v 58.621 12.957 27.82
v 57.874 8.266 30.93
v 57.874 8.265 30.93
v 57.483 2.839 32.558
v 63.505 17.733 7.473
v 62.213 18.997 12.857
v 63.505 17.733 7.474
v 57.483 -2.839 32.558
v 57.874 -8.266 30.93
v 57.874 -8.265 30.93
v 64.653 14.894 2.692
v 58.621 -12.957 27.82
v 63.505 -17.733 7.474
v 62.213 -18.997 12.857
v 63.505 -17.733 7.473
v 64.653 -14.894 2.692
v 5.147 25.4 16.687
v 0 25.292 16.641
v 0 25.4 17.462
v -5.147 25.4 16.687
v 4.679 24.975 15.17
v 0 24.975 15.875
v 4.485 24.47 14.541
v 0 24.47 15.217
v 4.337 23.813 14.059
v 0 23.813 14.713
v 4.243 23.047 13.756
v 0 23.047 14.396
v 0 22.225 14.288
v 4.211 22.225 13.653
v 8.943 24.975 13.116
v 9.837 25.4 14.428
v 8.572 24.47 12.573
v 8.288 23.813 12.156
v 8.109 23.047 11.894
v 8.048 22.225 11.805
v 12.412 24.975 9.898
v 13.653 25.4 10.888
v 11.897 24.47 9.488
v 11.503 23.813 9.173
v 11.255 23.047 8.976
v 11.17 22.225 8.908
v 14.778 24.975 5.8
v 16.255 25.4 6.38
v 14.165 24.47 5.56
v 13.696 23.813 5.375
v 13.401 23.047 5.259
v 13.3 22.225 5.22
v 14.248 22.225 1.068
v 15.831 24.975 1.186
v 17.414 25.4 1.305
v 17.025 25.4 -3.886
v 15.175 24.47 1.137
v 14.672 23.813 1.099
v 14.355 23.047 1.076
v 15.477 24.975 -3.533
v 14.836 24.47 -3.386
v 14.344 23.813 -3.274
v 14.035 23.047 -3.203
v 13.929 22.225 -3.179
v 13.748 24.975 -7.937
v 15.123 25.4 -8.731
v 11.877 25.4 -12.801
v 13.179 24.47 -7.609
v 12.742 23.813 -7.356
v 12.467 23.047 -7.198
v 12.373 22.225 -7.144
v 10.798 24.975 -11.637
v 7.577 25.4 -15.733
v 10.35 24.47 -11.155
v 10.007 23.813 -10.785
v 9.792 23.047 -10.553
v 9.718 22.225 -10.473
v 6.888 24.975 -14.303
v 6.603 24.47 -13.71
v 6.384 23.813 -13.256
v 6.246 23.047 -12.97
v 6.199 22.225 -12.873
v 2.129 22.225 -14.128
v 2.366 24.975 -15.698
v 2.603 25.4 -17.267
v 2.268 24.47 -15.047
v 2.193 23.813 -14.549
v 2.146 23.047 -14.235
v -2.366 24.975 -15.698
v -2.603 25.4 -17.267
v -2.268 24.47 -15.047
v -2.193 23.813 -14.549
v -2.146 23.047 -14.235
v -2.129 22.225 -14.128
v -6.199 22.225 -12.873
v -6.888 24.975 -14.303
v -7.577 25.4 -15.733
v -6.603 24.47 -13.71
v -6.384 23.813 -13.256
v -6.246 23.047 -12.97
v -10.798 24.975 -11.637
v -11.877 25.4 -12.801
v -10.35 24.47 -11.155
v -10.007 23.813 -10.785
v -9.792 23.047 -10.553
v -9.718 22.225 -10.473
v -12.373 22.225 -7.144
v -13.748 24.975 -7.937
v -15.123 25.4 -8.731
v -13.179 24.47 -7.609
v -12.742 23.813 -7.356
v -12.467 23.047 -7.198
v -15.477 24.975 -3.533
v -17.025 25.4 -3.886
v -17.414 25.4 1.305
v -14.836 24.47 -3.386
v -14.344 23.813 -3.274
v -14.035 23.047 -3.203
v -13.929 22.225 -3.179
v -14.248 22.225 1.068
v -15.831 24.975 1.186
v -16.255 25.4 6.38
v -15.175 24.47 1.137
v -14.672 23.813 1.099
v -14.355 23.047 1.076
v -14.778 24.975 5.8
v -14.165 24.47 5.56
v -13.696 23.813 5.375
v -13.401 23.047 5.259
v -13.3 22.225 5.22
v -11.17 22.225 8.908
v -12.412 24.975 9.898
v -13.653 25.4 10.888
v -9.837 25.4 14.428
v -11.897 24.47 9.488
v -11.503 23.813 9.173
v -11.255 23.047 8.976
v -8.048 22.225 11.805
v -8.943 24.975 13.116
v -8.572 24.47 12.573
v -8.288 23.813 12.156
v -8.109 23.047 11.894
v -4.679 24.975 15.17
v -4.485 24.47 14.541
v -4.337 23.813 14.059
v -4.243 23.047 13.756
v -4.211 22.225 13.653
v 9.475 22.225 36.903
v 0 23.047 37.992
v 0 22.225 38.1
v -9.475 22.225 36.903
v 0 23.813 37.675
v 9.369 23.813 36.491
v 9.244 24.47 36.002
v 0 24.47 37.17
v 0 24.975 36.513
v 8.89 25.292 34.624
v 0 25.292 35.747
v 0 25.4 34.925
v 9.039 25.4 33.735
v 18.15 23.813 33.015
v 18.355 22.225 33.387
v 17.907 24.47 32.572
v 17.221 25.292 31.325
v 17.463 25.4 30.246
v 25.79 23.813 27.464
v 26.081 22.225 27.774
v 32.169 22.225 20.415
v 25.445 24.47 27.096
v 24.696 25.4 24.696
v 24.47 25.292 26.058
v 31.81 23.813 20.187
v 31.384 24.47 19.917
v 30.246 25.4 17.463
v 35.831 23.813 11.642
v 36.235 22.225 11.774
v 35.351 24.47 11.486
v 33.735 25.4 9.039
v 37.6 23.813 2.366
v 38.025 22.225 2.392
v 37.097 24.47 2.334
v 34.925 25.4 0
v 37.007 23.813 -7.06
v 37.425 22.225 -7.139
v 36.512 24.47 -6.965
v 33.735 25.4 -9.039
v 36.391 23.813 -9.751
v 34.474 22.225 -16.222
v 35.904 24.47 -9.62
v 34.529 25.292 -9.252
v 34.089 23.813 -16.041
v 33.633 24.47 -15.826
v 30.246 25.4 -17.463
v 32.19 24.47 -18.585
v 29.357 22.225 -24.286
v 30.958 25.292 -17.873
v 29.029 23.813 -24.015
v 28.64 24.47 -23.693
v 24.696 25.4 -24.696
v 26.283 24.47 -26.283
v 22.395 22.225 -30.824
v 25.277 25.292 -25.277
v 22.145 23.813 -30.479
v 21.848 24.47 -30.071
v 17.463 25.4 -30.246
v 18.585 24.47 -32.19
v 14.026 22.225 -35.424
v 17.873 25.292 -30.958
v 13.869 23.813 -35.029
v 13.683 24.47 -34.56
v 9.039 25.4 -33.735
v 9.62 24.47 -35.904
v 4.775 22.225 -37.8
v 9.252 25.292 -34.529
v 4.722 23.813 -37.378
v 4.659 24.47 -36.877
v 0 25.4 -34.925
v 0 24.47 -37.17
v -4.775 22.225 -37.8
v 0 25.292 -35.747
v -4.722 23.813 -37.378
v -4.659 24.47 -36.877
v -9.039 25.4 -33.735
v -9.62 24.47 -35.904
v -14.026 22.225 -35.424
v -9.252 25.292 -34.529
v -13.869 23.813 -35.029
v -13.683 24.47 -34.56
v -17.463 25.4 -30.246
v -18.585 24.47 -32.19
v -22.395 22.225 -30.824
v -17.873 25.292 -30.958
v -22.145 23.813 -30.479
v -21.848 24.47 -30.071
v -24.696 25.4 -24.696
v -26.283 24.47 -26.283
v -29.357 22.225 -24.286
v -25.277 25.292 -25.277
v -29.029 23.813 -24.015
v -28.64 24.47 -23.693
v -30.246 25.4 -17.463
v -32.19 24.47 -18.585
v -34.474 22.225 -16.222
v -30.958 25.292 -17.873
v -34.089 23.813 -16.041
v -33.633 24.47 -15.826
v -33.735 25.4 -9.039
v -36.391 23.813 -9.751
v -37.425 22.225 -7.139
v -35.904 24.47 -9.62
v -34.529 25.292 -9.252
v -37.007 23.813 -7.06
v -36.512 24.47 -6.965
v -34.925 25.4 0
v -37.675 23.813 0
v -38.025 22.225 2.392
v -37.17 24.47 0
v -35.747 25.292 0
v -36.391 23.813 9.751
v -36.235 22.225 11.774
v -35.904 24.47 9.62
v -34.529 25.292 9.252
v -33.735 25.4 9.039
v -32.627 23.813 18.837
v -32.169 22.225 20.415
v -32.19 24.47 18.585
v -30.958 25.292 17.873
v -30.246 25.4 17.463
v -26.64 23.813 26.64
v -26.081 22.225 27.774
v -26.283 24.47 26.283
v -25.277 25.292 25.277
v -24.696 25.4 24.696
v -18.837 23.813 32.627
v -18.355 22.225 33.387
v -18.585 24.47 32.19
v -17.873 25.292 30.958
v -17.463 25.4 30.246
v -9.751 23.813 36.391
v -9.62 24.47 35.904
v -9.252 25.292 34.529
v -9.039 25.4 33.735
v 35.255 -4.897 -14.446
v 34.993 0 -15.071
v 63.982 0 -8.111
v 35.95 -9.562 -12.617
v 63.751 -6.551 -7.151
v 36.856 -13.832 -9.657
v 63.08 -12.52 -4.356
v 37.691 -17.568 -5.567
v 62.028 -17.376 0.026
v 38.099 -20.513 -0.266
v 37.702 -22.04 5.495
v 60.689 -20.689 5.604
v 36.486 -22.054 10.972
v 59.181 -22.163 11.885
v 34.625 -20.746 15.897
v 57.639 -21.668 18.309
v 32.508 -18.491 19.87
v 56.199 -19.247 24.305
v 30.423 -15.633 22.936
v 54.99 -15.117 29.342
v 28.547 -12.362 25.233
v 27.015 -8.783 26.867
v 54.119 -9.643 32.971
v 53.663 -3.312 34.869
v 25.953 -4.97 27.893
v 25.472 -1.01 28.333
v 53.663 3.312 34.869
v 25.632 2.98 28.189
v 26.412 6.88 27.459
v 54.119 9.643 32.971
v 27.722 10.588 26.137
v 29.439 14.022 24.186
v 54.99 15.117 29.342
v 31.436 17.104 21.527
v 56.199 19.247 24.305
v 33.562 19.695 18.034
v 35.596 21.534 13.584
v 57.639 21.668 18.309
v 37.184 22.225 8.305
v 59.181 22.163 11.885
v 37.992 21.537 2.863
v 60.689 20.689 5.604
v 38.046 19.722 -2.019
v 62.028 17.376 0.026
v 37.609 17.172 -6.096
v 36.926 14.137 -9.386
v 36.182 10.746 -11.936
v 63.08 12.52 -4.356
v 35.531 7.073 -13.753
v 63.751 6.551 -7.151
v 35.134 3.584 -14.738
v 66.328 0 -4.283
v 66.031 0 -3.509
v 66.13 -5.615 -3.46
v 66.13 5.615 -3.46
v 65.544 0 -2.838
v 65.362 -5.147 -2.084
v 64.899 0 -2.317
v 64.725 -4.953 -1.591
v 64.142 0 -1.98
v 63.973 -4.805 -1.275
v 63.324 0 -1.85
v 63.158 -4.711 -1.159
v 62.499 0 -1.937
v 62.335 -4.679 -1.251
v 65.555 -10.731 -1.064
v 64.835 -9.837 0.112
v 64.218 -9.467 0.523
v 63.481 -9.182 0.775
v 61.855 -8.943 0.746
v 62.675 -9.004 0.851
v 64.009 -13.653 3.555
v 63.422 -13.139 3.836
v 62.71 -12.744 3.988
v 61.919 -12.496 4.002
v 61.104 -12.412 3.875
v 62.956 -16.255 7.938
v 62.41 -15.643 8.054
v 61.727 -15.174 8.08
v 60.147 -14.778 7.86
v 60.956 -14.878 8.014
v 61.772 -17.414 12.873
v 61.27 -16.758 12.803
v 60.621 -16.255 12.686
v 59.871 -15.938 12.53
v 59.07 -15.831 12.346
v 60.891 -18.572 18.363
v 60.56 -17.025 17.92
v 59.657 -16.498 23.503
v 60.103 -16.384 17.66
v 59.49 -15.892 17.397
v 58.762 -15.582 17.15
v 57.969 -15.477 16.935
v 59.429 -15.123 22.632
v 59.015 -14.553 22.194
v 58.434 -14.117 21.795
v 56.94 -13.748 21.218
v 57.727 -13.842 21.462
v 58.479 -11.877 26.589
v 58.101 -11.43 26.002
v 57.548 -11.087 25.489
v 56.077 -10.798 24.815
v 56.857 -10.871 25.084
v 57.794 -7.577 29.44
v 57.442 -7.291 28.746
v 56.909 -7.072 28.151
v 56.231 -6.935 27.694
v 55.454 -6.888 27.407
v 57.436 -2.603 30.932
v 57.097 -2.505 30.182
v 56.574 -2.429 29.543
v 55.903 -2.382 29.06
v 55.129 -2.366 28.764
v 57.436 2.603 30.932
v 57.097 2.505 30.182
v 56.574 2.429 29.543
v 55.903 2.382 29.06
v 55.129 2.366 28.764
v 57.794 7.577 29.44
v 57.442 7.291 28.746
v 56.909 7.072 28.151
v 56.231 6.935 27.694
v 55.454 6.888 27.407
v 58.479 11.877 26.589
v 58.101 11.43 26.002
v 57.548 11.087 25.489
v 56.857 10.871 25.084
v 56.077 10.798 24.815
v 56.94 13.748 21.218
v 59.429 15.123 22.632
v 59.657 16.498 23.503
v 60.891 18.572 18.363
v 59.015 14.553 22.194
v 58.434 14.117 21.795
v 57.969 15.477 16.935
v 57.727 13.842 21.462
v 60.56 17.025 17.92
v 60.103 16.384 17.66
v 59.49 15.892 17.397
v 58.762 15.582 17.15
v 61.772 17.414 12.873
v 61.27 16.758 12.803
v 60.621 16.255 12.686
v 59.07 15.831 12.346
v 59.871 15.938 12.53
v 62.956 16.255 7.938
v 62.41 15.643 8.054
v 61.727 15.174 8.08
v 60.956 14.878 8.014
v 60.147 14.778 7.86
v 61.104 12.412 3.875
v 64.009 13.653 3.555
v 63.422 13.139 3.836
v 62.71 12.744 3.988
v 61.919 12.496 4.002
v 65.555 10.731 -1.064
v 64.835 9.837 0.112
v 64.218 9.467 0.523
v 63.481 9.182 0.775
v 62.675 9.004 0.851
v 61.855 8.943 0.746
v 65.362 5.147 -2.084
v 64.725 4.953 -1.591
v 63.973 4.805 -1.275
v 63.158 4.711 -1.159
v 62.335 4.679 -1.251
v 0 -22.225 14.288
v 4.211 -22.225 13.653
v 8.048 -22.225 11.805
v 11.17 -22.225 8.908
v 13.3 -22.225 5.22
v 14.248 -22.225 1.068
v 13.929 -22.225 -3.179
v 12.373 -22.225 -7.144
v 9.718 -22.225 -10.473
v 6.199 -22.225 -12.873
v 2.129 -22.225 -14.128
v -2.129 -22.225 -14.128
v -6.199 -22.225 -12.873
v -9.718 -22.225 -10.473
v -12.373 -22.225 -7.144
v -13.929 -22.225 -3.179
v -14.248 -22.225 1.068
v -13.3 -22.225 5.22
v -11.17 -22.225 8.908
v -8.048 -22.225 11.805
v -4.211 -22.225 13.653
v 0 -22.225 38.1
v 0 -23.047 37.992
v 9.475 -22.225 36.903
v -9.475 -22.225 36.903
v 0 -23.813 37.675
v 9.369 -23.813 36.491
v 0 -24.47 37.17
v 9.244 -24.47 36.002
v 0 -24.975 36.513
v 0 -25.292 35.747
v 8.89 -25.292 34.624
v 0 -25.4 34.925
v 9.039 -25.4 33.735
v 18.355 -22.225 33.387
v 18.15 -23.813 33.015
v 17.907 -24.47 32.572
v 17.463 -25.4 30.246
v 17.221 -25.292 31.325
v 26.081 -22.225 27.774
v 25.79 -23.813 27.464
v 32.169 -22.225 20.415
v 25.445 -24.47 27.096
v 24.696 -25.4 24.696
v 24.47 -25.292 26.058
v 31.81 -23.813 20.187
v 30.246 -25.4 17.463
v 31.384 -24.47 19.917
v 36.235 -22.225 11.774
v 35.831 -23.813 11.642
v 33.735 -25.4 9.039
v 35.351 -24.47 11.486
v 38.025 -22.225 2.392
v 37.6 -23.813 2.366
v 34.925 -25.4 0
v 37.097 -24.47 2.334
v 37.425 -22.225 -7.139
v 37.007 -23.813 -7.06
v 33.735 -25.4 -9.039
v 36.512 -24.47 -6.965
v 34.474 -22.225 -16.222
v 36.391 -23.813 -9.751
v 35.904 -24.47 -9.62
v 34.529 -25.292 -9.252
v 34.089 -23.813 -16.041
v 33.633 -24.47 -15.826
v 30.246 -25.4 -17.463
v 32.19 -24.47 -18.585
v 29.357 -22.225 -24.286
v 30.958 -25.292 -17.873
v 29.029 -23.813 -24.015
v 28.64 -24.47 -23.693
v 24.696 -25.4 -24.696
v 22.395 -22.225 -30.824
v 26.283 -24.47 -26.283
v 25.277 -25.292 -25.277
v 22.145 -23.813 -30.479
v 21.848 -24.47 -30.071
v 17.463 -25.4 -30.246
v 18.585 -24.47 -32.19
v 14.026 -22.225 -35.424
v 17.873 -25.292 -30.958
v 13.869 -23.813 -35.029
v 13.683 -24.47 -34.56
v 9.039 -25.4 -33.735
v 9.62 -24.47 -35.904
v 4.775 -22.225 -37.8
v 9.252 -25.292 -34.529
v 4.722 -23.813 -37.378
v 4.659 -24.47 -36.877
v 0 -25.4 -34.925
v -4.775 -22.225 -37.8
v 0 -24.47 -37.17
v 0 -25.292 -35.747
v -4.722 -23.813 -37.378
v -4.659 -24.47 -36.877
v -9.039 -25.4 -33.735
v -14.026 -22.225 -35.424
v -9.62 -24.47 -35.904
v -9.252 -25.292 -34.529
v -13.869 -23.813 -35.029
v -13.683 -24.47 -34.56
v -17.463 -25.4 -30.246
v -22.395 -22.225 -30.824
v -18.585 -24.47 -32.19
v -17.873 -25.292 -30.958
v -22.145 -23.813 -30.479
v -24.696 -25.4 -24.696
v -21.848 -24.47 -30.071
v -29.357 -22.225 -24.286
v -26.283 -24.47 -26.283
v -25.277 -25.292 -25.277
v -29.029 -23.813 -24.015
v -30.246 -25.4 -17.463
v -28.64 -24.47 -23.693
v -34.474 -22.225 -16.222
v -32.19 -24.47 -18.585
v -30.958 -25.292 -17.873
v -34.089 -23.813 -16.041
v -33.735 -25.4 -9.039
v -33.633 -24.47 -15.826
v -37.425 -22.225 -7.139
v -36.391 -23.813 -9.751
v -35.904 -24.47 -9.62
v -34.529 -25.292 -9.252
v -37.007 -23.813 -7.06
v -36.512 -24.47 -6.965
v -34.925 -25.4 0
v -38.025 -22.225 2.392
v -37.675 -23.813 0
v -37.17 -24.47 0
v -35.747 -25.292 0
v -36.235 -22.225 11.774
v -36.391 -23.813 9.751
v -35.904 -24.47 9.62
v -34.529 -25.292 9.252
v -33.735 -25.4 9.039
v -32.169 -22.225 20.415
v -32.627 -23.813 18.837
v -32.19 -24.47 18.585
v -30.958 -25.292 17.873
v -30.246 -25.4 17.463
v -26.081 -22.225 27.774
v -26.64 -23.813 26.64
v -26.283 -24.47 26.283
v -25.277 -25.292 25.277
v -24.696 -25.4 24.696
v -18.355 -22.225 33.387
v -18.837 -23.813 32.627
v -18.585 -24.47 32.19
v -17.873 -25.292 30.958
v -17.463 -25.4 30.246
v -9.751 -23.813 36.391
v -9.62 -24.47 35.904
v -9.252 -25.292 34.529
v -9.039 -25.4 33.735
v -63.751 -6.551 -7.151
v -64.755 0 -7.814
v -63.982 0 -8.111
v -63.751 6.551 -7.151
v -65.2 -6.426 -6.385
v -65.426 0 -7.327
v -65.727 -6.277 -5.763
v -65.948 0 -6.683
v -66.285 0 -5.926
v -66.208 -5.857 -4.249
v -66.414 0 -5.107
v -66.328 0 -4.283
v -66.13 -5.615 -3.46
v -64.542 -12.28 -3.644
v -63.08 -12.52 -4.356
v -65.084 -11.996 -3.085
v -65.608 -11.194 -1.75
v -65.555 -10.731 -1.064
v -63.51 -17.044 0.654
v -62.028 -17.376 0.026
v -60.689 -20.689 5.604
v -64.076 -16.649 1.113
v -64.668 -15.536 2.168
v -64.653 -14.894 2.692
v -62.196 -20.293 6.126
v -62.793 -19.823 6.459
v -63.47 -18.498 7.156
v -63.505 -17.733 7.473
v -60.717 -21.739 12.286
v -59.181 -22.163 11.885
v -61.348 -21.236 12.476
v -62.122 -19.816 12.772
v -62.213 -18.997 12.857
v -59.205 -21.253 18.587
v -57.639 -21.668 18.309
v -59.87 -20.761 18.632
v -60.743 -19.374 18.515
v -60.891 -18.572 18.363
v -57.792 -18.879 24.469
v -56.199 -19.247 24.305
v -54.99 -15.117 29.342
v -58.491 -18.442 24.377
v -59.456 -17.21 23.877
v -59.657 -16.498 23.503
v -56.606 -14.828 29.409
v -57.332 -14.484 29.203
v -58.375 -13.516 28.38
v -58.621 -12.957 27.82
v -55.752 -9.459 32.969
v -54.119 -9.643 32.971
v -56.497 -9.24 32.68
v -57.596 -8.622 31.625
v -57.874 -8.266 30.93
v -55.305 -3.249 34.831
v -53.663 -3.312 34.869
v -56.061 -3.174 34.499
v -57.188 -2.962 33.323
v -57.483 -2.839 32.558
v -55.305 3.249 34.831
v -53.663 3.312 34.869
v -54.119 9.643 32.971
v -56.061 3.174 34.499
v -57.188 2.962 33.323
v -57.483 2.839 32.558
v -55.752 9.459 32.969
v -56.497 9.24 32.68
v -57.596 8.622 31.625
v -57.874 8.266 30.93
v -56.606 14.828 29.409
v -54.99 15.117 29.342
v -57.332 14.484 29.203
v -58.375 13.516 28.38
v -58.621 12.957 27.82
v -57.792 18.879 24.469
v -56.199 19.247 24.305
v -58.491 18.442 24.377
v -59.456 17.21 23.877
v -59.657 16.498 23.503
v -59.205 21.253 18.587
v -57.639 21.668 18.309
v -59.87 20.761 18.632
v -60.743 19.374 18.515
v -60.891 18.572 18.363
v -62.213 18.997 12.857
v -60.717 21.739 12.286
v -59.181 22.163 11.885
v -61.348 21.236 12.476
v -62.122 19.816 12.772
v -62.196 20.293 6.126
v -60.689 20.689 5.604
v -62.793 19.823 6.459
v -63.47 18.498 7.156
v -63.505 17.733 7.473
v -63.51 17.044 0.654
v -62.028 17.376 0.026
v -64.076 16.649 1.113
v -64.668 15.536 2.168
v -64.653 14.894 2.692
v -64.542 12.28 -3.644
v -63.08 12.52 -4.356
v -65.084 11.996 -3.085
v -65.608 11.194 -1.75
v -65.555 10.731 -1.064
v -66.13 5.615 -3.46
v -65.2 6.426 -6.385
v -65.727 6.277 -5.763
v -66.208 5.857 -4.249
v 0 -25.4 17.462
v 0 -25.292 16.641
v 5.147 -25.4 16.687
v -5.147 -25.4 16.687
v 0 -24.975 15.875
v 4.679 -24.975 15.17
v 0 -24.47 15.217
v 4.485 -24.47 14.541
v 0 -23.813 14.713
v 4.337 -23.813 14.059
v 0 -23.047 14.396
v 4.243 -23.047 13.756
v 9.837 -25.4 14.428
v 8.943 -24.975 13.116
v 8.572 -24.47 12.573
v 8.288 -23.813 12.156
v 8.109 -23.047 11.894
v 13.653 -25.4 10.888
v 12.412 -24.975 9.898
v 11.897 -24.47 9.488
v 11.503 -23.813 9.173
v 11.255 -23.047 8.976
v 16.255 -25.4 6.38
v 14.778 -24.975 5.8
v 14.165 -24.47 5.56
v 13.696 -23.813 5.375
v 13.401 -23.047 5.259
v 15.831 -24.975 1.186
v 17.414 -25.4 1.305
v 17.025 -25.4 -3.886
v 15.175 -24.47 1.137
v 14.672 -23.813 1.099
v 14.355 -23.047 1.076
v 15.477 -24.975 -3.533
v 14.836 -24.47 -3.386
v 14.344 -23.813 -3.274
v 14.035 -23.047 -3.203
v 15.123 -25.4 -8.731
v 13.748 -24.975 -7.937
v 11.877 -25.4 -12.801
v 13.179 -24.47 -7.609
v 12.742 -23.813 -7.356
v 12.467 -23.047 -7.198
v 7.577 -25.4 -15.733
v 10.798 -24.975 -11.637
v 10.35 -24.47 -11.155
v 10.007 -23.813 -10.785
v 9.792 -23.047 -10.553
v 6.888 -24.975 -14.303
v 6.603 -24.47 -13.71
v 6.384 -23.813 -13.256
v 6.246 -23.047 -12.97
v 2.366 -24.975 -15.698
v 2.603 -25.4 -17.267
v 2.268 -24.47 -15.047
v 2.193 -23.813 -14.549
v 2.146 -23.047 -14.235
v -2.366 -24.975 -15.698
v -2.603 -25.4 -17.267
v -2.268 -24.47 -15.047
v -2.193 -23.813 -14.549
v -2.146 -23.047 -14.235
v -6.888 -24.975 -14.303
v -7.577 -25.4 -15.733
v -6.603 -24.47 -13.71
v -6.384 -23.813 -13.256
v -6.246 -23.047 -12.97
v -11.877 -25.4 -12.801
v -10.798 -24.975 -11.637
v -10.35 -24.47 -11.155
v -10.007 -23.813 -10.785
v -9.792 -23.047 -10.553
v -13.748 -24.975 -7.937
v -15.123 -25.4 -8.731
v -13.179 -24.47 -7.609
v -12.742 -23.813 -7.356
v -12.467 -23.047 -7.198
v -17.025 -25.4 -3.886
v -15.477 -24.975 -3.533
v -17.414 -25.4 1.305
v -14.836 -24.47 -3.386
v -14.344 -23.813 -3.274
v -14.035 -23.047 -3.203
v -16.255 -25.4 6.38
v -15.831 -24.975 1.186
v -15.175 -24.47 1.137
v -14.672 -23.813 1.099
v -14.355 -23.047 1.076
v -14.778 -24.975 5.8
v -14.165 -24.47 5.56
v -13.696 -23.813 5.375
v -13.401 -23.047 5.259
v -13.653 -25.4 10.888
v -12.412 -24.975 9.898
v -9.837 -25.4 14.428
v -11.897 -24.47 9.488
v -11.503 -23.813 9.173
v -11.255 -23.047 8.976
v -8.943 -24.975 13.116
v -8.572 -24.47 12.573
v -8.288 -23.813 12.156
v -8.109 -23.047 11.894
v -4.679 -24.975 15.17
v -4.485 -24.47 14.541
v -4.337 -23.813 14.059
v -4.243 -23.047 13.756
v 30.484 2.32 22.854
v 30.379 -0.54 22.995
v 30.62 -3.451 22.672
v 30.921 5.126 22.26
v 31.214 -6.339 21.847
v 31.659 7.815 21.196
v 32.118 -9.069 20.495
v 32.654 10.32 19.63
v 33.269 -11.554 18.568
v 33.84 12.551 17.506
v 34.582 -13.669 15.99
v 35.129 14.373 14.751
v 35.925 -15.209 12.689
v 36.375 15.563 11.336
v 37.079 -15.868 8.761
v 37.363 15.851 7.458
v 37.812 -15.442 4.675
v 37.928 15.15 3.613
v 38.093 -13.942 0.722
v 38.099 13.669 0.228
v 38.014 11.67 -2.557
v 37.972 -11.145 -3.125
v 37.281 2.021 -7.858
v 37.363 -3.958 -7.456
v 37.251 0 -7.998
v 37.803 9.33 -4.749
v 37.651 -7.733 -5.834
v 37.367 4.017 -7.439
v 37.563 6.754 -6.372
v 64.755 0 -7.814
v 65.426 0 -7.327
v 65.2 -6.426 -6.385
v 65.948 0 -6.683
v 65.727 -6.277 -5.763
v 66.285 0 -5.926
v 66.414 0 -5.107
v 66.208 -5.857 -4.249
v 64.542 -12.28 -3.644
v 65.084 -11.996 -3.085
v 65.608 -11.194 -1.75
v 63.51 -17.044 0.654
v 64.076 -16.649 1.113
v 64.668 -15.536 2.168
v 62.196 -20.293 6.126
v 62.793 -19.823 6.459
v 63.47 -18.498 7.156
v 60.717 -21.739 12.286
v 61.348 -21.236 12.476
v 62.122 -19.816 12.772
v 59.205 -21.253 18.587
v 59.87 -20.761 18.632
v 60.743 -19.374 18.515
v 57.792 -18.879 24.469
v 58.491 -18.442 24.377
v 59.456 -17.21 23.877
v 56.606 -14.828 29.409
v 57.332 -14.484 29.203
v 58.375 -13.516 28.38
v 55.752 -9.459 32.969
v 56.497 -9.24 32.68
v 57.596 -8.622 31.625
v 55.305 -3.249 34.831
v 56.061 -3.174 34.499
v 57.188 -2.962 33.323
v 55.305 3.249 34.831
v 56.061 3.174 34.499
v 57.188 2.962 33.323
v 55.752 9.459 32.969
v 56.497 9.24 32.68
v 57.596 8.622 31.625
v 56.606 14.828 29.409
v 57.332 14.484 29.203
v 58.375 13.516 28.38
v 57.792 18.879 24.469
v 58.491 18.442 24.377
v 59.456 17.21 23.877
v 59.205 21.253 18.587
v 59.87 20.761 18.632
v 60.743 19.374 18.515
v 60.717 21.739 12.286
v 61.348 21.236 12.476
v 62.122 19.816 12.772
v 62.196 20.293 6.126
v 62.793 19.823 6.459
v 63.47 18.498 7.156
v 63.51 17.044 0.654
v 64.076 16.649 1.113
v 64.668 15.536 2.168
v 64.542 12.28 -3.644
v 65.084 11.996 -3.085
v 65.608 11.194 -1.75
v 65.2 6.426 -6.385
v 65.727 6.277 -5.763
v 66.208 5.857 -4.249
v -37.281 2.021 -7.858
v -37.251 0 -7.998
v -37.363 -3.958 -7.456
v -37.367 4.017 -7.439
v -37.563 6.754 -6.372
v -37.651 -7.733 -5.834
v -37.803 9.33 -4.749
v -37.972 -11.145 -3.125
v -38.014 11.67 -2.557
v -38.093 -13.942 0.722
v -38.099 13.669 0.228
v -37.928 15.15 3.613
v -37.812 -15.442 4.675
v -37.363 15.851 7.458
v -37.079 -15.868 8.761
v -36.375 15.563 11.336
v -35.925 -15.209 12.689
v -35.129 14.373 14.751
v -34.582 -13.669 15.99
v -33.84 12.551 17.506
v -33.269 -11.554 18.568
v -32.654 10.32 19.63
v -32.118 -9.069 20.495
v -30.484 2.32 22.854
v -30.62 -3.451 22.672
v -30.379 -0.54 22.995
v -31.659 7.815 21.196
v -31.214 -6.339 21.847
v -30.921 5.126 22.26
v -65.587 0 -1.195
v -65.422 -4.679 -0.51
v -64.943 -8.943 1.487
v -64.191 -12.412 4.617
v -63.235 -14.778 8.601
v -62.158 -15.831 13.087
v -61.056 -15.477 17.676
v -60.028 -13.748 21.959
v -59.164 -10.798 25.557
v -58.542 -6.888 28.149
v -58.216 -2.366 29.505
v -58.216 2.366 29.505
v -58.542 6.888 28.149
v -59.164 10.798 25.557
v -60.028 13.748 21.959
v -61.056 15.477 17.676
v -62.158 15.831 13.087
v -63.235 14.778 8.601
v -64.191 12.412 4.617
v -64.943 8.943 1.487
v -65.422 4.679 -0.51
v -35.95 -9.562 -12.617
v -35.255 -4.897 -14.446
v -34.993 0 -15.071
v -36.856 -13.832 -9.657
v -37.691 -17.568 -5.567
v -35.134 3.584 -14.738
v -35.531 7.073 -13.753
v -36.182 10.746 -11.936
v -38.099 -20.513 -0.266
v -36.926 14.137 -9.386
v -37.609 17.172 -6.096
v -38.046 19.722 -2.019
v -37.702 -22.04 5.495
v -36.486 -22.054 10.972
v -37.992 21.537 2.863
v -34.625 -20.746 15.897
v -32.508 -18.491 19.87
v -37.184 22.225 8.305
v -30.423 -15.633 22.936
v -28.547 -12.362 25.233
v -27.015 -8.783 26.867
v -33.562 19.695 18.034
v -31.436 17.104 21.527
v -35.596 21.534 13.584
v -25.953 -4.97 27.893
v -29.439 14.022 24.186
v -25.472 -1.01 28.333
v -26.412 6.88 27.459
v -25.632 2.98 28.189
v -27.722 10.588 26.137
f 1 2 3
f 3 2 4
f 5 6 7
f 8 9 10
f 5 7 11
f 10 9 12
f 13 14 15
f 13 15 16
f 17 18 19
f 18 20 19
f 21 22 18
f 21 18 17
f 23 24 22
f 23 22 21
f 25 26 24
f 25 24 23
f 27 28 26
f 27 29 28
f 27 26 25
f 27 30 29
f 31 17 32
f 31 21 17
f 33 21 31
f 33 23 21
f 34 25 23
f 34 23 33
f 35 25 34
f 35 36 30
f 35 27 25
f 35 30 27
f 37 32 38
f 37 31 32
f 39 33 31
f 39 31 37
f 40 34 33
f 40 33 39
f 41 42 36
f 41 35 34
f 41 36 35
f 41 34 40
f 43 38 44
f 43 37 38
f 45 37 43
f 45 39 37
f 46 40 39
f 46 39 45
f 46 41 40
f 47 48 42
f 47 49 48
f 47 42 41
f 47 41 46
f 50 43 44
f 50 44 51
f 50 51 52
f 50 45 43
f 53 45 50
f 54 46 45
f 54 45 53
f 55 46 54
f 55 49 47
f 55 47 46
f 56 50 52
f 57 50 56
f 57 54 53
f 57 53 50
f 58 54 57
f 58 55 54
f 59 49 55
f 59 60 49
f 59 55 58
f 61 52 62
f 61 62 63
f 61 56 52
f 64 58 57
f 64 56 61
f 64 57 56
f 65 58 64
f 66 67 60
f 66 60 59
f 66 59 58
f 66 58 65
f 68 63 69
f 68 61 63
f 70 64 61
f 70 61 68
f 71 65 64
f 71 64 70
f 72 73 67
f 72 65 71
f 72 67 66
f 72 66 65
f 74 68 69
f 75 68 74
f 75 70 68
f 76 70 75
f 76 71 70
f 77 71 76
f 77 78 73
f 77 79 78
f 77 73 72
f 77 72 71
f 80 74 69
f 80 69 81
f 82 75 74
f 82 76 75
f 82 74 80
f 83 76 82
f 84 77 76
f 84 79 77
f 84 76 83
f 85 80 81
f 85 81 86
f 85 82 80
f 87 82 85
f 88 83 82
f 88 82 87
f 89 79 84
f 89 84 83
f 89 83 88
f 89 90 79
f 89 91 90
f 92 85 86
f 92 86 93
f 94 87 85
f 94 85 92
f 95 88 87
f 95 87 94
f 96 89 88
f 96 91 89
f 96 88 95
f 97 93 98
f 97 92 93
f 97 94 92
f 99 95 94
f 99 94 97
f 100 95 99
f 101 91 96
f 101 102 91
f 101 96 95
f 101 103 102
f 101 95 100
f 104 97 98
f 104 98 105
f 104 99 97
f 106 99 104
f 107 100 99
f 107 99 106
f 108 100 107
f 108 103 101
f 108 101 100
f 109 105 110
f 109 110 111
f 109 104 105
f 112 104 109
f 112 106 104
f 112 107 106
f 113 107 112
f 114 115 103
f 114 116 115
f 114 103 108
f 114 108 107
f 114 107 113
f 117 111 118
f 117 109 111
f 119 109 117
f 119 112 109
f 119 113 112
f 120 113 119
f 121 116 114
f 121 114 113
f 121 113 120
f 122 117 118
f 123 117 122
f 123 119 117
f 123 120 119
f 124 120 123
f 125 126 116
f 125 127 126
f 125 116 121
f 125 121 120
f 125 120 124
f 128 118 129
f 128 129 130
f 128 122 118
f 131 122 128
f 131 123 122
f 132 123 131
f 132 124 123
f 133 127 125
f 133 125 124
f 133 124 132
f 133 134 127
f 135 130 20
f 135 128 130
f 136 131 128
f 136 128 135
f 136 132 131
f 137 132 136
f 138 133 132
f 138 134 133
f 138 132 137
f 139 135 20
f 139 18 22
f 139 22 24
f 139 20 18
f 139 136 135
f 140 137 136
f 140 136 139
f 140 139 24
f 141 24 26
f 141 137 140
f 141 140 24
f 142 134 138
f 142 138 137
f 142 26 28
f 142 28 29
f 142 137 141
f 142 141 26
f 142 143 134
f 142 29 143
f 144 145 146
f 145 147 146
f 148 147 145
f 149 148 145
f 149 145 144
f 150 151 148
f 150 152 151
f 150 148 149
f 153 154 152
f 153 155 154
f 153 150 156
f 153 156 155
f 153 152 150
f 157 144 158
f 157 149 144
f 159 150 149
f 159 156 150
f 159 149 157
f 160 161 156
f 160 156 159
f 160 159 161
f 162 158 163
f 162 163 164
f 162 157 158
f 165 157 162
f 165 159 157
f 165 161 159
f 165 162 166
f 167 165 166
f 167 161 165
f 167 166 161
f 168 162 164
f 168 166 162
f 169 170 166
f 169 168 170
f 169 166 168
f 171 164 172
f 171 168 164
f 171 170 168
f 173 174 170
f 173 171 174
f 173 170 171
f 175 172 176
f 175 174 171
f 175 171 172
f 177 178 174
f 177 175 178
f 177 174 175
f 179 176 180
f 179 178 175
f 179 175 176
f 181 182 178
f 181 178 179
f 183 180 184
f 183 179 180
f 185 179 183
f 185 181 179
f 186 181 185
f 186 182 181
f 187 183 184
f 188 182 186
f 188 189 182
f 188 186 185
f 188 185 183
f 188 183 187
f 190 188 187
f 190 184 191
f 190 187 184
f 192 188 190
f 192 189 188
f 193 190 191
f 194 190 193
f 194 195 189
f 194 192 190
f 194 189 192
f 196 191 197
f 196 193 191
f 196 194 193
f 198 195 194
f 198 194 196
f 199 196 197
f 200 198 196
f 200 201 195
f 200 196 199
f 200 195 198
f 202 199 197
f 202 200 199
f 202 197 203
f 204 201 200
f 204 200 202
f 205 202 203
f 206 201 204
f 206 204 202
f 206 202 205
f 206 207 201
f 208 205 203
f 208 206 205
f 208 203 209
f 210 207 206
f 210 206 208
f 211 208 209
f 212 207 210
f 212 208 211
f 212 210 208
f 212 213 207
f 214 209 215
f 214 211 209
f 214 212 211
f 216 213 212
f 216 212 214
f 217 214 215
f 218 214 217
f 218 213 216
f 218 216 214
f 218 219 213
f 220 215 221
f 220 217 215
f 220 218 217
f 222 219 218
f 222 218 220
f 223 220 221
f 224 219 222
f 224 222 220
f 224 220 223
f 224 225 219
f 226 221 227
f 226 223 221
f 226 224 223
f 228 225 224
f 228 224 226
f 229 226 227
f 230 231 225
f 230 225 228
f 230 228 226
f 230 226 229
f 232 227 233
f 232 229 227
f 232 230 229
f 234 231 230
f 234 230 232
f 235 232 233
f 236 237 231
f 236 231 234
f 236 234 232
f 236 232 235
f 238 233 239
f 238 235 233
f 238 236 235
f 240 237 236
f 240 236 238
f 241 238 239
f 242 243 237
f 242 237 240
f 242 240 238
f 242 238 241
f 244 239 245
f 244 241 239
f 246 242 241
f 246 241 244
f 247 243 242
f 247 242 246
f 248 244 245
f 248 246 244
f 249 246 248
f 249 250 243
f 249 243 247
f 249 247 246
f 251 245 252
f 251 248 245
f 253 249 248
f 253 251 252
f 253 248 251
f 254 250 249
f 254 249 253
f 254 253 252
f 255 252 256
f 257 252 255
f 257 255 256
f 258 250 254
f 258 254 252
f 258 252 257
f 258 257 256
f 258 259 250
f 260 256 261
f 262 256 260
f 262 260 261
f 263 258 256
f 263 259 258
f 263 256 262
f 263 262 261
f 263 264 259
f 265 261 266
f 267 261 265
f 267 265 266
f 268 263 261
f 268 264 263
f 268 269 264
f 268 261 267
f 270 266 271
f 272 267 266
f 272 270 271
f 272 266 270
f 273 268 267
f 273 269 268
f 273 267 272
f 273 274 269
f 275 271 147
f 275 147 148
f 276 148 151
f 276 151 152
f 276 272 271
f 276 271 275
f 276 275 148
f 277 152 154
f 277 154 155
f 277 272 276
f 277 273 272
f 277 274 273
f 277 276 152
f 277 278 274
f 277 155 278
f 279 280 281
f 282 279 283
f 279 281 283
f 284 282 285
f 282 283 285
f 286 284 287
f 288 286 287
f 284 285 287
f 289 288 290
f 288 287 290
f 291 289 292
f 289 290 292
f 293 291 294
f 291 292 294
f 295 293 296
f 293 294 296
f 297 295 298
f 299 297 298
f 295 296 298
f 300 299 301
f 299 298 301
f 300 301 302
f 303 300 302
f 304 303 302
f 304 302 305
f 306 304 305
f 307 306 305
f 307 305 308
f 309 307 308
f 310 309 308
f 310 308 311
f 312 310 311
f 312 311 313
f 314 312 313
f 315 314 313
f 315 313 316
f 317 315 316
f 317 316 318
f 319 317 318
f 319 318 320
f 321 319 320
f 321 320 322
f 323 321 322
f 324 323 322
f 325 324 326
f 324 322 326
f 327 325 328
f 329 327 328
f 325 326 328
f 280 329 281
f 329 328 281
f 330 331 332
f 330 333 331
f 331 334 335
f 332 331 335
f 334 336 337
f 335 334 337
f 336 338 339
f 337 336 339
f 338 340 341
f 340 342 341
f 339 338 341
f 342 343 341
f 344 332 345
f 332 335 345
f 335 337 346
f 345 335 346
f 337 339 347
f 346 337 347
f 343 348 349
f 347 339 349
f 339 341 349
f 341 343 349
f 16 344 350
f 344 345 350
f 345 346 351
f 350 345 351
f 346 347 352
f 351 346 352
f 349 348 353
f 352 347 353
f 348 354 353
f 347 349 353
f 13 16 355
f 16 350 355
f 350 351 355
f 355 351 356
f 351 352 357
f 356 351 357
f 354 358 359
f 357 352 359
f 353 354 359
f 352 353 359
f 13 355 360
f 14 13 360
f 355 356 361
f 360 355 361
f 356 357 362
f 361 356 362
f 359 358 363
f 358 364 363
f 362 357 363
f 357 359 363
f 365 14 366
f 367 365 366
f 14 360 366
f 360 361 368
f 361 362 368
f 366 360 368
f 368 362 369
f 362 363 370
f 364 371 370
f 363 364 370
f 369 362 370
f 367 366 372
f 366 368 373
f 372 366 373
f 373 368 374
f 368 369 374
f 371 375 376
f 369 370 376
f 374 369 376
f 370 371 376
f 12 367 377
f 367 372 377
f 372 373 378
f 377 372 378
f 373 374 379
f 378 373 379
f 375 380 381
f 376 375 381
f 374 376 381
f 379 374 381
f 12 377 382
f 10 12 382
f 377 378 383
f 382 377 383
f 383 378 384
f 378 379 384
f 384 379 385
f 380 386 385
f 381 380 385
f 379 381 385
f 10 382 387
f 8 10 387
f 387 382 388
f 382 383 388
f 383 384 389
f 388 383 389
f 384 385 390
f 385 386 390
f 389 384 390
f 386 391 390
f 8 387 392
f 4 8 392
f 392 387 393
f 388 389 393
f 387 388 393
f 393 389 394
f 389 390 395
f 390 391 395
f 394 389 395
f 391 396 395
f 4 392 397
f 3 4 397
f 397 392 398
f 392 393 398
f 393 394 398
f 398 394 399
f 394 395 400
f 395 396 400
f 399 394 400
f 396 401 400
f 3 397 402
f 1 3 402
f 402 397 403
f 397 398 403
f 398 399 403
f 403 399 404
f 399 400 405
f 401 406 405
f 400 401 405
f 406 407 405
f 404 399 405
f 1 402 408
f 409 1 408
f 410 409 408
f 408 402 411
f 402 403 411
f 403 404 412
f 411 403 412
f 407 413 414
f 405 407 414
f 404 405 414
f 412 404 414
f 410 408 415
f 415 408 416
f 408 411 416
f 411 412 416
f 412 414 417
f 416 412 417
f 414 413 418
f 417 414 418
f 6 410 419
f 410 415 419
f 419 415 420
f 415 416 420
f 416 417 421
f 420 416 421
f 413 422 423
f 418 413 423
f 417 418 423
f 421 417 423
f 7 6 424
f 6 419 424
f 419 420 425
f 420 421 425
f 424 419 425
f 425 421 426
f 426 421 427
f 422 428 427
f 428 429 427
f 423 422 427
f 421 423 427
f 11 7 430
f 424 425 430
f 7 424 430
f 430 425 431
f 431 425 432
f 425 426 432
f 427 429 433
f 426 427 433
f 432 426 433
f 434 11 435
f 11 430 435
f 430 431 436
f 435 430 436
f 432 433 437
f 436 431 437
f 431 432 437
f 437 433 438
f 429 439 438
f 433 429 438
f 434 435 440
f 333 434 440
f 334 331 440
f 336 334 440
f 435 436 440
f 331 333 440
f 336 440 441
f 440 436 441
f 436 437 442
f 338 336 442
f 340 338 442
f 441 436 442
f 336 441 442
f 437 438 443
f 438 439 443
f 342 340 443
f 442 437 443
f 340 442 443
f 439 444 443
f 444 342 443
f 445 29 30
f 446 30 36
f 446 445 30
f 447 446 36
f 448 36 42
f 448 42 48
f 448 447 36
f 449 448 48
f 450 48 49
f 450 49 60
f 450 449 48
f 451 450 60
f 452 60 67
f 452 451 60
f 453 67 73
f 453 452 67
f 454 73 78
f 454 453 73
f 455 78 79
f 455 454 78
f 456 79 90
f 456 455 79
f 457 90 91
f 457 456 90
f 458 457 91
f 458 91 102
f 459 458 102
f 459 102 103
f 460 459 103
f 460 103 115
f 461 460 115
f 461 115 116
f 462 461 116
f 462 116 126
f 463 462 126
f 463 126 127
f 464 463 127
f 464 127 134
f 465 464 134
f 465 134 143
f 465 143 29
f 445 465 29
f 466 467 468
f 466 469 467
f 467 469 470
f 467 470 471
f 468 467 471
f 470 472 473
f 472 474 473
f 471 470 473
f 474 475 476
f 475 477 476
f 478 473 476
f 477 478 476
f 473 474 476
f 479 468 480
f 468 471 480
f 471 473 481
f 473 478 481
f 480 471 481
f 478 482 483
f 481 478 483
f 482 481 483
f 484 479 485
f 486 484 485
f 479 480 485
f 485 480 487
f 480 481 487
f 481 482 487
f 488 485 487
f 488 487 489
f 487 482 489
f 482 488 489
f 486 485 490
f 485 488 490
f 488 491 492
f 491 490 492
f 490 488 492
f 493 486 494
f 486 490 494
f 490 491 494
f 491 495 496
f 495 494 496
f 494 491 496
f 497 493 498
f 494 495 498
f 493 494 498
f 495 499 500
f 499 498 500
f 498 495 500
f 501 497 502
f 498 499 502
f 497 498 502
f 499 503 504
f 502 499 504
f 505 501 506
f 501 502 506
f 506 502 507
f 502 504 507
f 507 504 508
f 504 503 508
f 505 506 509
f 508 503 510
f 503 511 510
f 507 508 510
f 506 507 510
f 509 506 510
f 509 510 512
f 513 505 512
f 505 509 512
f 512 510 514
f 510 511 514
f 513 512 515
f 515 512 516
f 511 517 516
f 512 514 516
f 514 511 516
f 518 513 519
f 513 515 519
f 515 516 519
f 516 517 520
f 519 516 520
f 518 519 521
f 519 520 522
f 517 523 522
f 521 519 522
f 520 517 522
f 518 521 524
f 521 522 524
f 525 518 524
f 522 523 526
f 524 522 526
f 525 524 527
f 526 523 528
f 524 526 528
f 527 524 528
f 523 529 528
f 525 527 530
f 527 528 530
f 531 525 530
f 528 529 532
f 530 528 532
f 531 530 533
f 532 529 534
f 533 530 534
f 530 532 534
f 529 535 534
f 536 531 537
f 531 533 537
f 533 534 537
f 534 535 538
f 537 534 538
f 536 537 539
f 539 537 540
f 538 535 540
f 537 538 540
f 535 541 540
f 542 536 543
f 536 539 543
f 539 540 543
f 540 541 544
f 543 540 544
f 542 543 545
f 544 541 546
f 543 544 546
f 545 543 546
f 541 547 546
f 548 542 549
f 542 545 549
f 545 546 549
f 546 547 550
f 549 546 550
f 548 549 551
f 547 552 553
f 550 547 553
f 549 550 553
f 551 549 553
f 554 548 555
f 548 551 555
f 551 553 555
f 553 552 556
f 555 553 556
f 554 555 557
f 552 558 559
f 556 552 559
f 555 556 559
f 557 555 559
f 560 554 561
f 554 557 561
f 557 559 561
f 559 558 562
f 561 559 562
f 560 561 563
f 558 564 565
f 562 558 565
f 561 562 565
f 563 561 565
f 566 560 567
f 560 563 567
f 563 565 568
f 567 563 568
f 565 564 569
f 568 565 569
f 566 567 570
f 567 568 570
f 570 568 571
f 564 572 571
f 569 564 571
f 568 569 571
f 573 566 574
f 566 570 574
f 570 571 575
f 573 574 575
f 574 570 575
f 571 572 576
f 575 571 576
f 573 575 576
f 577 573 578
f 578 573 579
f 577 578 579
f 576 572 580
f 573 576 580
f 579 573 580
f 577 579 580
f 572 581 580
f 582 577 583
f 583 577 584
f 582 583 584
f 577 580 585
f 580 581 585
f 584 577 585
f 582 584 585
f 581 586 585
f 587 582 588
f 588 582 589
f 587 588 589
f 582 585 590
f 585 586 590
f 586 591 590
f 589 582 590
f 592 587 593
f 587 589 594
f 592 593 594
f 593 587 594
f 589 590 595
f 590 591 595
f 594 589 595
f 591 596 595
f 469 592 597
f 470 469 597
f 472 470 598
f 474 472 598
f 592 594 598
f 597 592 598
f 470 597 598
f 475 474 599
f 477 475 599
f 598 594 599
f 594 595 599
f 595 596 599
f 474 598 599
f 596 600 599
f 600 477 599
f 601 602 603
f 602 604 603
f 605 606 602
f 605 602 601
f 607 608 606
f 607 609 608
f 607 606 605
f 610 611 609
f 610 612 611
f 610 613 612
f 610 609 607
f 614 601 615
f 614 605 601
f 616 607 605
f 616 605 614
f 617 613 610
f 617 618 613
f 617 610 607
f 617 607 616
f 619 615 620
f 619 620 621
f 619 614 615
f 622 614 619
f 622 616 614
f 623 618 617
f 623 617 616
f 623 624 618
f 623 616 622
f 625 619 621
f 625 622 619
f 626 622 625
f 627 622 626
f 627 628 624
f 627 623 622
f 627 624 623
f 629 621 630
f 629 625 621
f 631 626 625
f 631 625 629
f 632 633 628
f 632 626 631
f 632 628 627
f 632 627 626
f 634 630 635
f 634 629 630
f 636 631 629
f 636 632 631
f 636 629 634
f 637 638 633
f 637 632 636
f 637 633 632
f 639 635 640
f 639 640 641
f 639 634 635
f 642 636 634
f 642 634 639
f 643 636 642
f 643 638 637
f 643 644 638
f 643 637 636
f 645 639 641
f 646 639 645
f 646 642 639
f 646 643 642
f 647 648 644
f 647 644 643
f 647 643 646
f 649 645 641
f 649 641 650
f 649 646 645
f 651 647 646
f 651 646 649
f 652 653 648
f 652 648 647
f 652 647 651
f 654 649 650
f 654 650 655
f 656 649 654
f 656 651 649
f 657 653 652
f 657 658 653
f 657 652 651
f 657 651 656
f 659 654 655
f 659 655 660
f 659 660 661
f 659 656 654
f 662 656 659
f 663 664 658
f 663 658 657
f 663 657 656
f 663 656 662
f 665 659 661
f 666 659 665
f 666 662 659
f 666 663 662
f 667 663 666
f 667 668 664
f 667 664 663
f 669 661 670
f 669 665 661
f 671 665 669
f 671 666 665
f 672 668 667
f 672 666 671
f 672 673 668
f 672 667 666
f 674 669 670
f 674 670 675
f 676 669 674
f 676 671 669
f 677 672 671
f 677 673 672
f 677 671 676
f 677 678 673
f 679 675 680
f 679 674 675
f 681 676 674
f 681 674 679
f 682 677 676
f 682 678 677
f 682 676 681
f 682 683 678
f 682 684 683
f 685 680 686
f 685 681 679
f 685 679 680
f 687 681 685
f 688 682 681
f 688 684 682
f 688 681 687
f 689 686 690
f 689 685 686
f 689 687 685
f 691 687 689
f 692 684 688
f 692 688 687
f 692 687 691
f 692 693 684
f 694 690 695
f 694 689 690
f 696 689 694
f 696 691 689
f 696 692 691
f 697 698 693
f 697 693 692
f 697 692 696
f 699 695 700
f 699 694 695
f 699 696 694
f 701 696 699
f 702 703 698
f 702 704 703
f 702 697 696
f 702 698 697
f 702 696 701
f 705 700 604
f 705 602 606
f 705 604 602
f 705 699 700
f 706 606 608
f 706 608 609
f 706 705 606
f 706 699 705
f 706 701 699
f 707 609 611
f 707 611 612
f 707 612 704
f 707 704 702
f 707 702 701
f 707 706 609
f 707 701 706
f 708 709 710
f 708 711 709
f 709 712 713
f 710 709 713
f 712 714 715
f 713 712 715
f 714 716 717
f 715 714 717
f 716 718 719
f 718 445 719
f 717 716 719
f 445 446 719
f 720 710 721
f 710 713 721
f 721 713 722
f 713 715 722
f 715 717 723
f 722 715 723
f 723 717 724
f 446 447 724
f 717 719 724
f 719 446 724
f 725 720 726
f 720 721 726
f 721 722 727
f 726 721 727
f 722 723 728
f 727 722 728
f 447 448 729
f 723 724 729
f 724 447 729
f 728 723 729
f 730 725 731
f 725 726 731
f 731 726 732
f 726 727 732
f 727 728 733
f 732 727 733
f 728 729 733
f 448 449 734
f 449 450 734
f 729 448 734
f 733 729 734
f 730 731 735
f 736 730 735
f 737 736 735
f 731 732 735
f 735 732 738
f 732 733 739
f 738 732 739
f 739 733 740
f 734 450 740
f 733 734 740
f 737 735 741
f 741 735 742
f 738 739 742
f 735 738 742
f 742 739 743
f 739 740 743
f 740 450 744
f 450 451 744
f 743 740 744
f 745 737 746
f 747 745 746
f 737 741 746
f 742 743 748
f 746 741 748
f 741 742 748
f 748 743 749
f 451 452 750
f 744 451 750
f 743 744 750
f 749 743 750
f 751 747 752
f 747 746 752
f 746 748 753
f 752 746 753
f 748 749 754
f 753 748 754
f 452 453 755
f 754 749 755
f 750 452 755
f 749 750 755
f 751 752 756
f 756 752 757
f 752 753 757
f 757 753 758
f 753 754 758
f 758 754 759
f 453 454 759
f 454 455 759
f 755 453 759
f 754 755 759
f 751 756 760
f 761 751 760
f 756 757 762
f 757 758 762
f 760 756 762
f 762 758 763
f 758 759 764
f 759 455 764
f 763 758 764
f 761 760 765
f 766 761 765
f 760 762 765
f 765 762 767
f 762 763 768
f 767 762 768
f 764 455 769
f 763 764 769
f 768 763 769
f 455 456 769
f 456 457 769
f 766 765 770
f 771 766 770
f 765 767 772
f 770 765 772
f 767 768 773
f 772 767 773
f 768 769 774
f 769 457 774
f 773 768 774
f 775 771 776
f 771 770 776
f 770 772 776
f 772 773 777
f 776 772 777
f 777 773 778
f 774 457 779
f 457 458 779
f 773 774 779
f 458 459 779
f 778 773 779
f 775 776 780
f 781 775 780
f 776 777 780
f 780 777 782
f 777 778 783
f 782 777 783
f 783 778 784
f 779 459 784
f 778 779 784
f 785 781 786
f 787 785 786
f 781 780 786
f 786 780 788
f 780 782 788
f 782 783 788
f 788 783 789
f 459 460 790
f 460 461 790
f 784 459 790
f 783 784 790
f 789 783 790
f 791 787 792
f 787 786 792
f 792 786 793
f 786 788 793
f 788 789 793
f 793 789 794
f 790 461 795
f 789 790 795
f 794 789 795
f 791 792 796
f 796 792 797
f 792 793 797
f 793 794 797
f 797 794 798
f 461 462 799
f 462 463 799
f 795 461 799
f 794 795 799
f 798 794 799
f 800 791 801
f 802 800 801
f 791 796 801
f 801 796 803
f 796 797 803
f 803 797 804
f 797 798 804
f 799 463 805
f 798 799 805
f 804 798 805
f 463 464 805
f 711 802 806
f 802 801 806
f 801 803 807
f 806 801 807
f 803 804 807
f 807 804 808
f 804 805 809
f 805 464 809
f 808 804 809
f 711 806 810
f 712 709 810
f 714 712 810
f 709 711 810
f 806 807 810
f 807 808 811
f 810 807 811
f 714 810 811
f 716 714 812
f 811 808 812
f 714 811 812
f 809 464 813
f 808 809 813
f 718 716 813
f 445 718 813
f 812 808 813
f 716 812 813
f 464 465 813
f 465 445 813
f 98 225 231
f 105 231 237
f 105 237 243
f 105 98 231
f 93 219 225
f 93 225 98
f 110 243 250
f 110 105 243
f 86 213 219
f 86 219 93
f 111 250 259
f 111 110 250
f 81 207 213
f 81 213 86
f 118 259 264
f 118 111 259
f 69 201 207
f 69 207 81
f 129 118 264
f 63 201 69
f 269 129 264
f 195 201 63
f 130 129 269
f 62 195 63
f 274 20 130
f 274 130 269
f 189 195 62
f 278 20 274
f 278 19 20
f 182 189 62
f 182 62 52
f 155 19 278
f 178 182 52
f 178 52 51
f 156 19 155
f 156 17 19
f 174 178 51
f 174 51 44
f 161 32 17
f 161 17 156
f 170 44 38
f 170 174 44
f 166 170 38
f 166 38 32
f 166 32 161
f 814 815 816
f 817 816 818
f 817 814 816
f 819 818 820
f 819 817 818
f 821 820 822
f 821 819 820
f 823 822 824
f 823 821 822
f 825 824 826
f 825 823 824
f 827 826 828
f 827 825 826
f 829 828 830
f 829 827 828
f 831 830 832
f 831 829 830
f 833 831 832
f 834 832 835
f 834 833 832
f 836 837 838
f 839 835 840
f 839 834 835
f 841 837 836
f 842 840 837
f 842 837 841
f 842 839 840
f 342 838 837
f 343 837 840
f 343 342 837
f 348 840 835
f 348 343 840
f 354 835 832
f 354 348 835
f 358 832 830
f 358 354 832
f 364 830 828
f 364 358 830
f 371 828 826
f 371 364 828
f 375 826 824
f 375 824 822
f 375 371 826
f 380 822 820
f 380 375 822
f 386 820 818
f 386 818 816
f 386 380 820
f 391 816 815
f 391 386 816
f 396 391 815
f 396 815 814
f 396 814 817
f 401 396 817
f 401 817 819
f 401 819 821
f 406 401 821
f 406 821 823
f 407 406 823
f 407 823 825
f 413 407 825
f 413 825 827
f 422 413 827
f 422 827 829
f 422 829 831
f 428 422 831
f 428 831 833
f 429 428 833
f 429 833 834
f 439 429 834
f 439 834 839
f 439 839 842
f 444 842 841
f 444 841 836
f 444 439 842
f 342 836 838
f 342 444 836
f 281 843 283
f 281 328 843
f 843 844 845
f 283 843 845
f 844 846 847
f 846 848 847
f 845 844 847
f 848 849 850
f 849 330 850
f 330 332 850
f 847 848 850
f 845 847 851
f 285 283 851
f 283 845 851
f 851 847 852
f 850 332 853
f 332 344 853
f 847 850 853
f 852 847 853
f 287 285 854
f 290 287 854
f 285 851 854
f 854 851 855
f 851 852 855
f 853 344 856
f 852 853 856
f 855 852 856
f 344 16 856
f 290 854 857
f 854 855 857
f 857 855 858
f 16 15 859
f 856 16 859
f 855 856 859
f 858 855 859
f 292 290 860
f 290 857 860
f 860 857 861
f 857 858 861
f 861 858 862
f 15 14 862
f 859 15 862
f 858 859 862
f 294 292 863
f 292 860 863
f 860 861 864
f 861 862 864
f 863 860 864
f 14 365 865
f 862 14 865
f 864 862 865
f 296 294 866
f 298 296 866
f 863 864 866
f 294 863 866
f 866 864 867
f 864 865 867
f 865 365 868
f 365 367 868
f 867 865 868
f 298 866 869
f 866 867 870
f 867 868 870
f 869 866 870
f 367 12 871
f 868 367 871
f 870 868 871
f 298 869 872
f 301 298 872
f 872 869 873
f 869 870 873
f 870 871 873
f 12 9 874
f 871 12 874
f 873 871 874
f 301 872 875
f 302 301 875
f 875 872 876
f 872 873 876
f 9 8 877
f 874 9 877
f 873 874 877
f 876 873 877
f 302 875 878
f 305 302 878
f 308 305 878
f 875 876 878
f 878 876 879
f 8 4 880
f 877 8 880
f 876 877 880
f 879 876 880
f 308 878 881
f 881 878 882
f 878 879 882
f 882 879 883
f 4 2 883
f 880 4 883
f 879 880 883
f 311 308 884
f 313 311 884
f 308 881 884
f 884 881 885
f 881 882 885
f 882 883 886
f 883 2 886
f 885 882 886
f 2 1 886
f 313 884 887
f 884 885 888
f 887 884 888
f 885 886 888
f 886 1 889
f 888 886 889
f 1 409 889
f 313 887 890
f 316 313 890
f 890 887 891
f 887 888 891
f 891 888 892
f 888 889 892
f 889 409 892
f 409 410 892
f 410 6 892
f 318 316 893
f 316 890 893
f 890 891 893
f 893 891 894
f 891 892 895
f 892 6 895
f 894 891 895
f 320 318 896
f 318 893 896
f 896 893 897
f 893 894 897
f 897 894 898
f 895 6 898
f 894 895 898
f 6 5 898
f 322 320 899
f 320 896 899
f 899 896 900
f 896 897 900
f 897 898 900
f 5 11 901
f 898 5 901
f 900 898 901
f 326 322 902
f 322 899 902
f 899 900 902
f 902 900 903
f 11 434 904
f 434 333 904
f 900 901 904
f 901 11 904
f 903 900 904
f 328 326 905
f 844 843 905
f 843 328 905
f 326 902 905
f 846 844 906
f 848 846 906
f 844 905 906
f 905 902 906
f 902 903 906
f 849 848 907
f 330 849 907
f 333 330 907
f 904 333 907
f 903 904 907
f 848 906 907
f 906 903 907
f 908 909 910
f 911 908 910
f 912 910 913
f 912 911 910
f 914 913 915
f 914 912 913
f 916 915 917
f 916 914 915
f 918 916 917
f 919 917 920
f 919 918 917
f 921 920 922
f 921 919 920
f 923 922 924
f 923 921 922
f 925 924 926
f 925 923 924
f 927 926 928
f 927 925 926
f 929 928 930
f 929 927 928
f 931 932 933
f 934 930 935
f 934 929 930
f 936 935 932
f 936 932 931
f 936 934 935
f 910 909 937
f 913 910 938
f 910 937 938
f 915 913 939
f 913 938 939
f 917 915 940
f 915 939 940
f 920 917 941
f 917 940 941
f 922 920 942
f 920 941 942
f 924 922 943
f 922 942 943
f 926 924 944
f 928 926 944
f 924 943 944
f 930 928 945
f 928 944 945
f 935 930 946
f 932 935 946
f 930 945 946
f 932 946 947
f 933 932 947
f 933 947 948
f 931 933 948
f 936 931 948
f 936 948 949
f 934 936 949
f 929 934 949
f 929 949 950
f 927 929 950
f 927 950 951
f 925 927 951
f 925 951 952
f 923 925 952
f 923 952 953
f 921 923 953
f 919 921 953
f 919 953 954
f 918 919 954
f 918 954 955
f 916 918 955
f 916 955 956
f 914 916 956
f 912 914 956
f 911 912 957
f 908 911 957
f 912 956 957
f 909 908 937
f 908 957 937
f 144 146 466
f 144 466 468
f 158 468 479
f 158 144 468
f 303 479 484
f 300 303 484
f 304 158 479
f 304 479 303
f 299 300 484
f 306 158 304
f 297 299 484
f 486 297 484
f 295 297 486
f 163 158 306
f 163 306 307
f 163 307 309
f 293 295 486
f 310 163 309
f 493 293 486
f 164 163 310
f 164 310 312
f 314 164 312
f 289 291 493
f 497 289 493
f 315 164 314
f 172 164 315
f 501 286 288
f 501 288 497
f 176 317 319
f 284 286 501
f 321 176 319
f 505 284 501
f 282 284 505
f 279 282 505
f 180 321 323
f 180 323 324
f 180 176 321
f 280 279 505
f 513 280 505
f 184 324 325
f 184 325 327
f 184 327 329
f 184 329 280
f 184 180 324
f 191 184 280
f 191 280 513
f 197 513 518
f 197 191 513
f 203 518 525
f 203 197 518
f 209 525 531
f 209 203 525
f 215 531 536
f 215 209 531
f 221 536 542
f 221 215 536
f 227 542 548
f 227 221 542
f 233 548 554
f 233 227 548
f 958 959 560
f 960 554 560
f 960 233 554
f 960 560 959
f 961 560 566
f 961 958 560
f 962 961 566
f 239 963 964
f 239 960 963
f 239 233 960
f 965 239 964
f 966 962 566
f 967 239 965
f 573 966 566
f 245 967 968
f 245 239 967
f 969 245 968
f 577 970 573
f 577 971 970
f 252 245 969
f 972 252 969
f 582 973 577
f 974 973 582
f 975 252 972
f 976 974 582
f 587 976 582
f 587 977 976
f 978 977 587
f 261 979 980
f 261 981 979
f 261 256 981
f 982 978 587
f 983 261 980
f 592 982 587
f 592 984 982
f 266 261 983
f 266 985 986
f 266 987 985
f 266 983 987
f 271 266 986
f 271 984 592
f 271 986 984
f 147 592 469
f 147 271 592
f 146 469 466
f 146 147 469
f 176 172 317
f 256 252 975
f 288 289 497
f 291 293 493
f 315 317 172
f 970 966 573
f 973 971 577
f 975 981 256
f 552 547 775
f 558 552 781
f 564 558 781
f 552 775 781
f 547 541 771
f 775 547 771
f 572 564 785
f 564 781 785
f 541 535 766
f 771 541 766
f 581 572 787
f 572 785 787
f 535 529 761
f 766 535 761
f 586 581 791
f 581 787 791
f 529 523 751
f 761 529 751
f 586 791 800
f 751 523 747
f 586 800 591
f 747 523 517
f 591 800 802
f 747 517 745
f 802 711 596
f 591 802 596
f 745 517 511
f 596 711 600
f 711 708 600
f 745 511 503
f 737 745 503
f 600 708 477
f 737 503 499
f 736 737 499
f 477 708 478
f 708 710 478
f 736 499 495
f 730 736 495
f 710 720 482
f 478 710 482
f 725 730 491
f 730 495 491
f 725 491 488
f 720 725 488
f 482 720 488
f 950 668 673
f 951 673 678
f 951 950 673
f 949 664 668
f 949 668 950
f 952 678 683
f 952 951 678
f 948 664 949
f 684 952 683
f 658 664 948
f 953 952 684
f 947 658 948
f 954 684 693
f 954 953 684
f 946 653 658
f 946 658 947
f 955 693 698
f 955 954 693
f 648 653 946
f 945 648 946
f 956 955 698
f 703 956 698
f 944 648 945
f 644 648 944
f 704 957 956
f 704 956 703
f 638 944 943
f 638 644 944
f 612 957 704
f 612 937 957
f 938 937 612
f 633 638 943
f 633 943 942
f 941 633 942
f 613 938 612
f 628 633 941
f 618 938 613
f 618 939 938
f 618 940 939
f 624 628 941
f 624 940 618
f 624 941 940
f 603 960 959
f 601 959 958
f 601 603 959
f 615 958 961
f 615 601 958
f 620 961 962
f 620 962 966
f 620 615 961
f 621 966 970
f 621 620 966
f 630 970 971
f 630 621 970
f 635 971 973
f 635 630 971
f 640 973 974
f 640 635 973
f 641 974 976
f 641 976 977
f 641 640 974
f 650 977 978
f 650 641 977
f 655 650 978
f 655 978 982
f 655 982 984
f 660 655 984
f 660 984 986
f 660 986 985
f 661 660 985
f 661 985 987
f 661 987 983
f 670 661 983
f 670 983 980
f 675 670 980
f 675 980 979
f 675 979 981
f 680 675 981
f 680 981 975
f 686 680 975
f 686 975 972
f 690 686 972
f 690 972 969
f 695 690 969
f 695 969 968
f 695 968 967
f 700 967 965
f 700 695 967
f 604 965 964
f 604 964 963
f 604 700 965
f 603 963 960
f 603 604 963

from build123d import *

# Parameters (mm, degrees)
SKETCH1_R           = 38.1
SKETCH1_R_2         = 14.2875
BOSS_EXTRUDE1_DEPTH = 25.4
BOSS_EXTRUDE2_START = -25.4
SKETCH3_R           = 22.225
SKETCH3_R_2         = 15.875
BOSS_EXTRUDE2_DEPTH = 33.655
FILLET1_R           = 3.175


with BuildPart() as part:
    # Sketch1 → Boss-Extrude1 (new, symmetric)
    with BuildSketch(Plane(origin=(0, 0, 0), x_dir=(1, 0, 0), z_dir=(0, 1, 0))):
        with Locations(Location((0, 0, 0), (0, 0, 270))):
            Circle(SKETCH1_R)
        with Locations(Location((0, 0, 0), (0, 0, 270))):
            Circle(SKETCH1_R_2, mode=Mode.SUBTRACT)
    extrude(amount=BOSS_EXTRUDE1_DEPTH, both=True)

    # Sketch3 → Boss-Extrude2 (add)
    with BuildSketch(Plane(origin=(37.182385695, 0, 8.311449576), x_dir=(-0.2334453638559059, 0, 0.9723699203976764), z_dir=(-0.9723699203976764, 0, -0.2334453638559059)).offset(BOSS_EXTRUDE2_START)):
        with Locations(Location((0, 0, 0), (0, 0, 180))):
            Circle(SKETCH3_R)
        with Locations(Location((0, 0, 0), (0, 0, 180))):
            Circle(SKETCH3_R_2, mode=Mode.SUBTRACT)
    boss_extrude2 = extrude(amount=BOSS_EXTRUDE2_DEPTH)

    # Mirror1: Boss-Extrude2 across plane
    add(boss_extrude2.mirror(Plane(origin=(0, 0, 0), x_dir=(0, 0, 1), z_dir=(1, 0, 0))))

    # Fillet1
    fillet1_edges = [part.edges().sort_by_distance(p)[0] for p in [
        (0, 25.4, -14.2875),
        (56.692258461, 0, 35.851883299),
        (58.174636521, 0, 29.677334305),
        (-56.692258461, 0, 35.851883299),
        (0, -25.4, -14.2875),
        (0, -25.4, -38.1),
        (0, 25.4, -38.1),
    ]]
    fillet(fillet1_edges, radius=FILLET1_R - 0.0001)  # a hair under: the kernel refuses the full size


solid = part.part
